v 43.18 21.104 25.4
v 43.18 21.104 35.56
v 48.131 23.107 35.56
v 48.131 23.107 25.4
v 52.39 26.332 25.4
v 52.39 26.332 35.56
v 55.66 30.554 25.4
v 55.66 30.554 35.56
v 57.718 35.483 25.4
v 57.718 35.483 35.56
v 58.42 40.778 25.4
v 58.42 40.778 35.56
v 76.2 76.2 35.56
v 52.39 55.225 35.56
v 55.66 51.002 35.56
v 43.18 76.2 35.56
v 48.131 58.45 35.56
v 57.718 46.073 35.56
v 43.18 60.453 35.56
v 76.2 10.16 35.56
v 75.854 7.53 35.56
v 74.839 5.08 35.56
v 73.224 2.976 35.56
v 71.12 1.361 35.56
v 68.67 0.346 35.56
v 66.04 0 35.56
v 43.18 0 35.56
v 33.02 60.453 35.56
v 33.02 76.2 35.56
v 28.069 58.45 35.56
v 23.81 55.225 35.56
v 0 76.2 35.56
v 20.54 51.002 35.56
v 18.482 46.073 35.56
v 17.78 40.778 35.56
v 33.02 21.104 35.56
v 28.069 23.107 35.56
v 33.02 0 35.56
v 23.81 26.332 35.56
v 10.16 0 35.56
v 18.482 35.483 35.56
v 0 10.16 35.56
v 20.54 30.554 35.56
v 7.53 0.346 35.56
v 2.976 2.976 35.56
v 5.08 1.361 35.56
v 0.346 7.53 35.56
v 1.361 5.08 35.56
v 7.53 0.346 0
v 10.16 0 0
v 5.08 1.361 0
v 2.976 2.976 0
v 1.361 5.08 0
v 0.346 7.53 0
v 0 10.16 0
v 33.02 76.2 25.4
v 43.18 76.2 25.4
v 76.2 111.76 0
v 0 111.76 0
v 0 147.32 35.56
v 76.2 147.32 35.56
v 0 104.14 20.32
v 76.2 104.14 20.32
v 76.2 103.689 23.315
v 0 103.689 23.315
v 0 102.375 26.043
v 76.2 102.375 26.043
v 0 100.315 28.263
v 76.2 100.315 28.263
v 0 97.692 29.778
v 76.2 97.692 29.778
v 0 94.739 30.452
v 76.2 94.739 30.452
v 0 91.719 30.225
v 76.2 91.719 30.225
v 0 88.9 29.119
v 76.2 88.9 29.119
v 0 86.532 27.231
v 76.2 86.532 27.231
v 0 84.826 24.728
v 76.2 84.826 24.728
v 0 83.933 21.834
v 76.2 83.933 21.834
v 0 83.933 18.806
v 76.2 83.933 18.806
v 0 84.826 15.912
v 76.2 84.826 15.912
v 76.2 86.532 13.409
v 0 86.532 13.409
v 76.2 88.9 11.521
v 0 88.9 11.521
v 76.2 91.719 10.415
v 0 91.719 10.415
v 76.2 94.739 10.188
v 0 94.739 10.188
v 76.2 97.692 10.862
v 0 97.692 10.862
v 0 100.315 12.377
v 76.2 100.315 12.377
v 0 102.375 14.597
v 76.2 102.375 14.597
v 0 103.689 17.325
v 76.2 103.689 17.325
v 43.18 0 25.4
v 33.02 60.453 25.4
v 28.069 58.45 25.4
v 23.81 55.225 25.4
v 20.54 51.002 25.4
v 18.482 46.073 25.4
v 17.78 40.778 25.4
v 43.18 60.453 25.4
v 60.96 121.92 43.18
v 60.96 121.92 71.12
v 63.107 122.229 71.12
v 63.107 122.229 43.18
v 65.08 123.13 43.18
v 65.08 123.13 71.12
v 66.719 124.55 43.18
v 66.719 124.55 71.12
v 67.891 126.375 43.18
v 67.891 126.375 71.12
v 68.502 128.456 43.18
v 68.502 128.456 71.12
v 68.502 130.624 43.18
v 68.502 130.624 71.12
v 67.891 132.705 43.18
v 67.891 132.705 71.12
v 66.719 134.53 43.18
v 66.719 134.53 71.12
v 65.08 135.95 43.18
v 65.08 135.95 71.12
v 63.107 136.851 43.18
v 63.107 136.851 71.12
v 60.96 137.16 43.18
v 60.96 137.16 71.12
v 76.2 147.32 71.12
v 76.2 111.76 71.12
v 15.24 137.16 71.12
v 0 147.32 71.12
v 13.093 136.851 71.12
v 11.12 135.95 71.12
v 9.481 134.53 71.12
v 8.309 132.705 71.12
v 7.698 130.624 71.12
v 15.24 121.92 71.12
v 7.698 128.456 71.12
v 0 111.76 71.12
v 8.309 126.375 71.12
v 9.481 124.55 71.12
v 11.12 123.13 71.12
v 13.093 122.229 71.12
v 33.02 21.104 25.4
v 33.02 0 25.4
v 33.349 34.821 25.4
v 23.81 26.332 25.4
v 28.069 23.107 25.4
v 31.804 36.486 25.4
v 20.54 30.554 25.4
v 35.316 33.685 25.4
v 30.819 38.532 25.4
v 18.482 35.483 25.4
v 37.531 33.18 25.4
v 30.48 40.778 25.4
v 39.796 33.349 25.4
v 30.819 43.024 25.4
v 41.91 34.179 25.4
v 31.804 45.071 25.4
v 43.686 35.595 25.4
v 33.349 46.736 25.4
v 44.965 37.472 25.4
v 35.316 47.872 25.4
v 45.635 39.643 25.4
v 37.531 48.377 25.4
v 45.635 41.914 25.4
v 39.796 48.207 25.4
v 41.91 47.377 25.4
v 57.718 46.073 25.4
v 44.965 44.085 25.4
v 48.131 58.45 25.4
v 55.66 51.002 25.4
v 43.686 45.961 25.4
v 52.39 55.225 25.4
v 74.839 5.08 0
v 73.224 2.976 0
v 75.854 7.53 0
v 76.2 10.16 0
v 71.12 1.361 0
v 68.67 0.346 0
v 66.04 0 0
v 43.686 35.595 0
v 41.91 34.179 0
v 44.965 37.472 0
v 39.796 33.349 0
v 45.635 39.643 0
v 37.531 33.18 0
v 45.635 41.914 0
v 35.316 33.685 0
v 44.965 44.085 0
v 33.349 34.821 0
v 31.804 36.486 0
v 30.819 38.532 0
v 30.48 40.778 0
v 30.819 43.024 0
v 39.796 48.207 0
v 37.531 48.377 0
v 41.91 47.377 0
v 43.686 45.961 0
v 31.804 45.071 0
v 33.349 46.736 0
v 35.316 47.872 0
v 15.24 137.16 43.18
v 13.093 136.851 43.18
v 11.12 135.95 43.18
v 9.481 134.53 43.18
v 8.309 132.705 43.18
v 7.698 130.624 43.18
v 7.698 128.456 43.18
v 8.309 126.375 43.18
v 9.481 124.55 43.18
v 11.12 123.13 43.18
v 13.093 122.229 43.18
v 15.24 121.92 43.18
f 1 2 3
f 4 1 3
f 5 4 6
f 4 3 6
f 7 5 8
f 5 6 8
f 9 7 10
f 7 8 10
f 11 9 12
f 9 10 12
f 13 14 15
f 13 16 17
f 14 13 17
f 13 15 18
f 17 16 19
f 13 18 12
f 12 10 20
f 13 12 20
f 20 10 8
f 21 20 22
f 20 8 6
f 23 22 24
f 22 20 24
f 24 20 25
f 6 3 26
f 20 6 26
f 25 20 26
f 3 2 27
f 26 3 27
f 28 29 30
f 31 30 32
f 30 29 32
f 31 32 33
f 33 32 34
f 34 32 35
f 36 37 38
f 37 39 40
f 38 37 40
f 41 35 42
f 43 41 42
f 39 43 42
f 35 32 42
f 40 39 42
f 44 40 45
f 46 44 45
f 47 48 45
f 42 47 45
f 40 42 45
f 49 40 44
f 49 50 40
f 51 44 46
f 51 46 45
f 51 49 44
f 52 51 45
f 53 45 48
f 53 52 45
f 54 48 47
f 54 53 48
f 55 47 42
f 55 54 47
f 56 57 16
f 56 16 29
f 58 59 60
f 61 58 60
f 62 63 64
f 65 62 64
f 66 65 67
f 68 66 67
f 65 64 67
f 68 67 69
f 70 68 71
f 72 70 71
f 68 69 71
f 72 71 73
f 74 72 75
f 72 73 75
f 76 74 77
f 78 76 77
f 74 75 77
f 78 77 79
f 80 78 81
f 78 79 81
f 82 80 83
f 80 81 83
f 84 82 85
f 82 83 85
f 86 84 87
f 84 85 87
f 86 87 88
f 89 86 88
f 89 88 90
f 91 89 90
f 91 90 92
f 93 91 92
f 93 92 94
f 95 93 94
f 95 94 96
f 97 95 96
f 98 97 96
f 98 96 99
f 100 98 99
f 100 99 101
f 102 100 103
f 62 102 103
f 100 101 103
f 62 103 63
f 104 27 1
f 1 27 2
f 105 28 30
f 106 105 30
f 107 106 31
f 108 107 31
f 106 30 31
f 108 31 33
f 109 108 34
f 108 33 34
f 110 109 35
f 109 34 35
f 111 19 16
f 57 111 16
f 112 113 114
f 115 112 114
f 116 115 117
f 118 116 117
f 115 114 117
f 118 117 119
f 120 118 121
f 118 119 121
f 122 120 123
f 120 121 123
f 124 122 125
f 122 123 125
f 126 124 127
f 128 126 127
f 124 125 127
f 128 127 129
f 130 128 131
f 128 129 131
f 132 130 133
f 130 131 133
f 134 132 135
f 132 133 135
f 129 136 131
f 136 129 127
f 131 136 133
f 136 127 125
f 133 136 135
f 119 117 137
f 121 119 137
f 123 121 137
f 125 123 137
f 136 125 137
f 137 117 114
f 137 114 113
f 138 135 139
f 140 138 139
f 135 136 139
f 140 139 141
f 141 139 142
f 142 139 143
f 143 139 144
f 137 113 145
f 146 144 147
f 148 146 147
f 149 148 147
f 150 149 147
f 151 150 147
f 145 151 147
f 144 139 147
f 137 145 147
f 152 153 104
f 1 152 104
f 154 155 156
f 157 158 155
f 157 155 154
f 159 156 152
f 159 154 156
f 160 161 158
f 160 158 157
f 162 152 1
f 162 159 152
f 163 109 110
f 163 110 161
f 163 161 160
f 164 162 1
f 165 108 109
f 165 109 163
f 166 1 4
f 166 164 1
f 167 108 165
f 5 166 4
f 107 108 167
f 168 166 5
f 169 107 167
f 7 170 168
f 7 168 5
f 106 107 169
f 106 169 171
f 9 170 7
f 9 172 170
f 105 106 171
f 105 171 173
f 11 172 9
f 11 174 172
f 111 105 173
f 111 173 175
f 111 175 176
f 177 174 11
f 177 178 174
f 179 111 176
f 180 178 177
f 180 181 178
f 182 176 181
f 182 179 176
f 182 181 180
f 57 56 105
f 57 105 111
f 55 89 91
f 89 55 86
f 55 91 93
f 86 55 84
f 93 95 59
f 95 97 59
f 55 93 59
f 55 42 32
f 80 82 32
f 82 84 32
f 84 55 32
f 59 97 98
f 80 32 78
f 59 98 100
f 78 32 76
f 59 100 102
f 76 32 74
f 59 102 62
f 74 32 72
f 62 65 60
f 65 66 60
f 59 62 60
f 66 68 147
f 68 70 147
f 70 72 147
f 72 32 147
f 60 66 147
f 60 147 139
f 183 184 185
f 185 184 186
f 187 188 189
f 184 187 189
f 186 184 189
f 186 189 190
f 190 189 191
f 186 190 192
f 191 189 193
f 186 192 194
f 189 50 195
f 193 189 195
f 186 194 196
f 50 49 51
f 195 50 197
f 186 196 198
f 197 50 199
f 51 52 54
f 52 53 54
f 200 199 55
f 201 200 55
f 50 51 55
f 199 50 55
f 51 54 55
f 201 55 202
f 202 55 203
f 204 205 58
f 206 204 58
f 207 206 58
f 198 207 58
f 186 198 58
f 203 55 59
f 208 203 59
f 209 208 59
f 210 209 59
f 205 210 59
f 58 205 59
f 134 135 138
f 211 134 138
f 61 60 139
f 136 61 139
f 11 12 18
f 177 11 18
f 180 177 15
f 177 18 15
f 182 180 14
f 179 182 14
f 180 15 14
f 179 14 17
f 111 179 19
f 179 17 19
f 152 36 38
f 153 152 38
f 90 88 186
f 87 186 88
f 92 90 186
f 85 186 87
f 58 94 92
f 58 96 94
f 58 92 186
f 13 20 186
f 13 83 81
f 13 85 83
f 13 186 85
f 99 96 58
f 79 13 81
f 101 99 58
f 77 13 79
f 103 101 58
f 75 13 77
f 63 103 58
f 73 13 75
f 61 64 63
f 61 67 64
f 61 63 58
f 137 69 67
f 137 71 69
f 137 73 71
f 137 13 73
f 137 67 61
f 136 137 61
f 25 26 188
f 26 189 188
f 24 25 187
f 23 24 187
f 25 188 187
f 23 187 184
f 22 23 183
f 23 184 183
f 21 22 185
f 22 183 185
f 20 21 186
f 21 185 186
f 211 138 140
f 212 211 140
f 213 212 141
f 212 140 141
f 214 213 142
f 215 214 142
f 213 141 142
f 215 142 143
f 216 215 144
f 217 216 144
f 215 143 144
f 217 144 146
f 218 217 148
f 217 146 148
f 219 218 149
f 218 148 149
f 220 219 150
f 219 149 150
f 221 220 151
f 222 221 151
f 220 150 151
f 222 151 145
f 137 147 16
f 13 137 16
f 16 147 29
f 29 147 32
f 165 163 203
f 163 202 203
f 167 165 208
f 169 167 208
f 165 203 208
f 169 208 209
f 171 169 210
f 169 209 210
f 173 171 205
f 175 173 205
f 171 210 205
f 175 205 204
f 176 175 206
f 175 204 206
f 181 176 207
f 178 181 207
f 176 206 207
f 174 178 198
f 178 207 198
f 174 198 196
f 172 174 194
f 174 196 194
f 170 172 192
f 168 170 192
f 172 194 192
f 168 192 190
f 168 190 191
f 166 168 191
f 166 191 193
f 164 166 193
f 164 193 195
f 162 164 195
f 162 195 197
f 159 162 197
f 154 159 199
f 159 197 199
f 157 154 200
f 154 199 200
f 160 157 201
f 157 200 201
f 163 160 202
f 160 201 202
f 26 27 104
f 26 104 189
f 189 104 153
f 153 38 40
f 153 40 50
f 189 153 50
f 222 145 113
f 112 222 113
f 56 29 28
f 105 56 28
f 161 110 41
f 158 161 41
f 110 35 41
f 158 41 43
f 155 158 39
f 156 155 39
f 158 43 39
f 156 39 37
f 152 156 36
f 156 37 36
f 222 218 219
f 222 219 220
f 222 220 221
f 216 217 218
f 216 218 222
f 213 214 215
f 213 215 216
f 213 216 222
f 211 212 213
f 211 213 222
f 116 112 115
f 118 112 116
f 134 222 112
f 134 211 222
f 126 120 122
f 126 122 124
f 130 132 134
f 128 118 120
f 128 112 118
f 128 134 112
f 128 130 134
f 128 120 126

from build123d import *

# Parameters (mm, degrees)
F1_DEPTH       = 76.2
F3_D           = 15.24
F3_CBORE_D     = 40.64
F3_CBORE_DEPTH = 10.16
F4_DEPTH       = 10.16
F5_R           = 10.16
F6_DEPTH       = 76.2
F8_DEPTH       = 27.94
F9_R           = 10.16


with BuildPart() as f1:
    # F0 (on Right) → F1 (new body)
    with BuildSketch(Plane.YZ):
        Polygon((0, 35.56), (0, 0), (111.76, 0), (147.32, 35.56), (147.32, 71.12), (111.76, 71.12), (76.2, 35.56), align=None)
    extrude(amount=F1_DEPTH)

    # F3 (through all)
    with Locations(Plane.XY.offset(35.56)):
        with Locations((38.1, 40.77832)):
            CounterBoreHole(F3_D / 2, F3_CBORE_D / 2, F3_CBORE_DEPTH)

    # F2 (on face) → F4 (cut)
    with BuildSketch(Plane.XY.offset(35.56)):
        with BuildLine():
            Line((33.02, 76.2), (33.02, 60.453076))
            ThreePointArc((33.02, 60.453076), (17.78, 40.77832), (33.02, 21.103565))
            Line((33.02, 21.103565), (33.02, 0))
            Line((33.02, 0), (43.18, 0))
            Line((43.18, 0), (43.18, 21.103565))
            ThreePointArc((43.18, 21.103565), (58.42, 40.77832), (43.18, 60.453076))
            Line((43.18, 60.453076), (43.18, 76.2))
            Line((43.18, 76.2), (33.02, 76.2))
        make_face()
    extrude(amount=-F4_DEPTH, mode=Mode.SUBTRACT)

    # F5 (on face) → F6 (cut)
    with BuildSketch(Plane.YZ.offset(76.2)):
        with Locations((93.98, 20.32)):
            Circle(F5_R)
    extrude(amount=-F6_DEPTH, mode=Mode.SUBTRACT)

    # F7 (on face) → F8 (cut)
    with BuildSketch(Plane.XY.offset(71.12)):
        with BuildLine():
            Line((60.96, 137.16), (15.24, 137.16))
            ThreePointArc((15.24, 137.16), (7.62, 129.54), (15.24, 121.92))
            Line((15.24, 121.92), (60.96, 121.92))
            ThreePointArc((60.96, 121.92), (68.58, 129.54), (60.96, 137.16))
        make_face()
    extrude(amount=-F8_DEPTH, mode=Mode.SUBTRACT)

    # F9
    f9_edges = [f1.edges().sort_by_distance(p)[0] for p in [
        (0, 0, 17.78),
        (76.2, 0, 17.78),
    ]]
    fillet(f9_edges, radius=F9_R)


solid = f1.part
